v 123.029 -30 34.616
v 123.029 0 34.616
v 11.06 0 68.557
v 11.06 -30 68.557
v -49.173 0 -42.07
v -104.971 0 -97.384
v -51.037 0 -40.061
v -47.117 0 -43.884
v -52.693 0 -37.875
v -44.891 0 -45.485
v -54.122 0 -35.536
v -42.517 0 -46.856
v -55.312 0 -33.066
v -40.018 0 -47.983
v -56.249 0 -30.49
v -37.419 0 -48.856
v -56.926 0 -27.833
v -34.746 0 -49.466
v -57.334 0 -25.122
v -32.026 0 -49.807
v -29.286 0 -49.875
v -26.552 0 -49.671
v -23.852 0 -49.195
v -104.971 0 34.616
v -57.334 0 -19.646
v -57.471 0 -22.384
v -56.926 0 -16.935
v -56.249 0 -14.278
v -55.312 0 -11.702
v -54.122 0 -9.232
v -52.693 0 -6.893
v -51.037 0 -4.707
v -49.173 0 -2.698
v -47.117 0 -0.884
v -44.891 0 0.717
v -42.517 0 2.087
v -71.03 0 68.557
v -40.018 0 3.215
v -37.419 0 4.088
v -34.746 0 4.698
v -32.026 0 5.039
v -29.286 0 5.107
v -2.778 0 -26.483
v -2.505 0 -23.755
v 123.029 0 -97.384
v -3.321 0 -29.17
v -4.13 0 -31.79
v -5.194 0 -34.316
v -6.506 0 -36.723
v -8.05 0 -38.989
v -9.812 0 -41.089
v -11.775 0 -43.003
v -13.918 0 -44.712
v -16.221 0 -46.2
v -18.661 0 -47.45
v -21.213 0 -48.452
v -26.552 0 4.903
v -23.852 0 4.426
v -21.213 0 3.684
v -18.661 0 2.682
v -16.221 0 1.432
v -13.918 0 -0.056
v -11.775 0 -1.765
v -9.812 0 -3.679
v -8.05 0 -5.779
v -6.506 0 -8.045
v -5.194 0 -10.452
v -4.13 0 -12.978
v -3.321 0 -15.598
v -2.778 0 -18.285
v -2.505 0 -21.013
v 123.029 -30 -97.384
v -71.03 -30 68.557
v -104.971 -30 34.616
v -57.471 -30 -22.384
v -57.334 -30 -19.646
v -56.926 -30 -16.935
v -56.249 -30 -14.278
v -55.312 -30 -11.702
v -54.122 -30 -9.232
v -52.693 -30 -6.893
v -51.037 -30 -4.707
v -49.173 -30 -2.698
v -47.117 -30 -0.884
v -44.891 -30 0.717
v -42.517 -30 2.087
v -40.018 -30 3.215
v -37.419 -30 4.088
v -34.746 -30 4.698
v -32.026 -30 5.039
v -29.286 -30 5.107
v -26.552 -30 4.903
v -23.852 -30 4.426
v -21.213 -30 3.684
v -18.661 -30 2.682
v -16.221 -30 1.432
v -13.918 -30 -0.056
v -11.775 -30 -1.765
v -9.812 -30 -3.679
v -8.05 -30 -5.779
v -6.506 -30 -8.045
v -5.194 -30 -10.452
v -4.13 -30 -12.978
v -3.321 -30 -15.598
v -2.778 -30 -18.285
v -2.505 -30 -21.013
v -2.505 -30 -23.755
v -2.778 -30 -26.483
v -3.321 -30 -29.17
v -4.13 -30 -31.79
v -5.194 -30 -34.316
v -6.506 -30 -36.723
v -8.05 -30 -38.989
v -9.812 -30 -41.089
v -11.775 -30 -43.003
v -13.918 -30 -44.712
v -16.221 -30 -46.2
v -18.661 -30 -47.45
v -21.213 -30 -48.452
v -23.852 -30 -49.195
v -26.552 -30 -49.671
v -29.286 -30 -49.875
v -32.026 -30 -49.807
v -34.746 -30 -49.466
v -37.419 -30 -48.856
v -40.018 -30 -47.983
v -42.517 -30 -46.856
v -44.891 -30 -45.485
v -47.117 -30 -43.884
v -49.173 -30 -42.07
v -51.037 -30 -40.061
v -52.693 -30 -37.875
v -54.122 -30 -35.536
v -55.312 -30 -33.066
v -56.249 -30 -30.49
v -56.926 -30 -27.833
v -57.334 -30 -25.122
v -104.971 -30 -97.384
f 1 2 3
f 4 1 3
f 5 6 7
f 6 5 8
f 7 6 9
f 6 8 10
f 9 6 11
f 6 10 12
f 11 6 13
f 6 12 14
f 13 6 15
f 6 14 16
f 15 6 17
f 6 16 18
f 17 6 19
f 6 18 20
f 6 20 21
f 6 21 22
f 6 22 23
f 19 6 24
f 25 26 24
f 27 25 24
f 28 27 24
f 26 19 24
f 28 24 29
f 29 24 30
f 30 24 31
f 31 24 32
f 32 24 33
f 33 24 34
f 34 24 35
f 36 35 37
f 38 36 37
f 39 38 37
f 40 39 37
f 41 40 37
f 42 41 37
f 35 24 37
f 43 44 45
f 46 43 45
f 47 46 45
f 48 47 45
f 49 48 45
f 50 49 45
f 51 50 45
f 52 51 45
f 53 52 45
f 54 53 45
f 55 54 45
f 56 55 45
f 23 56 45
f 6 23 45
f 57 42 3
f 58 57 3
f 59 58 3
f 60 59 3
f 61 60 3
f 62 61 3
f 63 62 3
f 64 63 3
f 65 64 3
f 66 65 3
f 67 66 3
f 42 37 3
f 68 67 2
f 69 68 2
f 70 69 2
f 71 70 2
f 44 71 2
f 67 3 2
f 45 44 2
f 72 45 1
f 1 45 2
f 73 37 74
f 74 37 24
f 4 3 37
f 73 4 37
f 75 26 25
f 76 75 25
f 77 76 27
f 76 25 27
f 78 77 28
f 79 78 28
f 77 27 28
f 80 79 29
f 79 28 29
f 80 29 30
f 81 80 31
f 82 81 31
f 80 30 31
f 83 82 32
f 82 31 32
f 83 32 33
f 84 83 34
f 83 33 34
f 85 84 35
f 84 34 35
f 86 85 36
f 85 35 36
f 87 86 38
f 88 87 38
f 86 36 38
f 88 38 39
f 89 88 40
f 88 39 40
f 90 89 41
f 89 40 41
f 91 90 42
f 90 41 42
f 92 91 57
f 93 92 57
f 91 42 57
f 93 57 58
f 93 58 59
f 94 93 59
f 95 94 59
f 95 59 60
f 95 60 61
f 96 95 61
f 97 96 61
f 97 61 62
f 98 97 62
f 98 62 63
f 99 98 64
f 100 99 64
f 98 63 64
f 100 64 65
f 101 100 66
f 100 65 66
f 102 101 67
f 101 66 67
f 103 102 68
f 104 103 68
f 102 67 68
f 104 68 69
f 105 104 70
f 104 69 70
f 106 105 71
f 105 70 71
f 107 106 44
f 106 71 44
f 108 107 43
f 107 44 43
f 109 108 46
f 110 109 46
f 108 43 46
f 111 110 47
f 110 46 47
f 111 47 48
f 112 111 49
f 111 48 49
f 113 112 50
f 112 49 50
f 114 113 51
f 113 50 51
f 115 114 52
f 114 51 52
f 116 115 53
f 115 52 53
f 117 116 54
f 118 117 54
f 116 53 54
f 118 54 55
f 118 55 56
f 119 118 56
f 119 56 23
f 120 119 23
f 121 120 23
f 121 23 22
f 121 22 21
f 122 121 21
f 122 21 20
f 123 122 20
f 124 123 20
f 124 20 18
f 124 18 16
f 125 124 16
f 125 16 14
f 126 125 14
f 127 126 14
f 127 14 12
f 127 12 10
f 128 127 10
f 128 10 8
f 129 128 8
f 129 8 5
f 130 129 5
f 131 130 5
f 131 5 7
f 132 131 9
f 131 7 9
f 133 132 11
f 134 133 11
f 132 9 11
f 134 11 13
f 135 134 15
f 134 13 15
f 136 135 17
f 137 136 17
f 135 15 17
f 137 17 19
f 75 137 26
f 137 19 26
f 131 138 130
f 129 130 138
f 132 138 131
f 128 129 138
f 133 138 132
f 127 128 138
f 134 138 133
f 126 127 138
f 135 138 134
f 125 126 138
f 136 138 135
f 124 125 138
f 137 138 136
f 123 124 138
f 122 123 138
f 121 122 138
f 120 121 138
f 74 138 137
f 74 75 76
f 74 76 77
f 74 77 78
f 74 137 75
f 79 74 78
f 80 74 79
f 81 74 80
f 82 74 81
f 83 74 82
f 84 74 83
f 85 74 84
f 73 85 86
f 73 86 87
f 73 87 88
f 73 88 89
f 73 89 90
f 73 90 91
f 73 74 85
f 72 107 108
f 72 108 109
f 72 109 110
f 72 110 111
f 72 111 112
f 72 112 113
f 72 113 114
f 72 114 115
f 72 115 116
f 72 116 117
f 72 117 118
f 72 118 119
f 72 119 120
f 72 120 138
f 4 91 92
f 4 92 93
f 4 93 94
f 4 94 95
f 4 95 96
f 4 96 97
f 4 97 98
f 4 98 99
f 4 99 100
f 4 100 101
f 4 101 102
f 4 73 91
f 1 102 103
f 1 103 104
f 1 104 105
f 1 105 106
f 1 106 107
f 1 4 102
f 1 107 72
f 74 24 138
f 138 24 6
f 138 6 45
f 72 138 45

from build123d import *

# Parameters (mm, degrees)
F1_DEPTH = 30


with BuildPart() as f1:
    # F0 (on Front) → F1 (new body)
    with BuildSketch(Plane.XZ):
        with BuildLine():
            ThreePointArc((-2.471096, -22.384027), (-29.971096, 5.115973), (-57.471096, -22.384027))
            ThreePointArc((-57.471096, -22.384027), (-29.971096, -49.884027), (-2.471096, -22.384027))
        make_face()
        Polygon((-71.02997, 68.557098), (-104.971096, 34.615973), (-104.971096, -22.384027), (-104.971096, -97.384027), (123.028904, -97.384027), (123.028904, 34.615973), (11.060159, 68.557098), align=None)
        with BuildLine():
            ThreePointArc((-2.471096, -22.384027), (-29.971096, -49.884027), (-57.471096, -22.384027))
            ThreePointArc((-57.471096, -22.384027), (-29.971096, 5.115973), (-2.471096, -22.384027))
        make_face(mode=Mode.SUBTRACT)
    extrude(amount=F1_DEPTH)


solid = f1.part
